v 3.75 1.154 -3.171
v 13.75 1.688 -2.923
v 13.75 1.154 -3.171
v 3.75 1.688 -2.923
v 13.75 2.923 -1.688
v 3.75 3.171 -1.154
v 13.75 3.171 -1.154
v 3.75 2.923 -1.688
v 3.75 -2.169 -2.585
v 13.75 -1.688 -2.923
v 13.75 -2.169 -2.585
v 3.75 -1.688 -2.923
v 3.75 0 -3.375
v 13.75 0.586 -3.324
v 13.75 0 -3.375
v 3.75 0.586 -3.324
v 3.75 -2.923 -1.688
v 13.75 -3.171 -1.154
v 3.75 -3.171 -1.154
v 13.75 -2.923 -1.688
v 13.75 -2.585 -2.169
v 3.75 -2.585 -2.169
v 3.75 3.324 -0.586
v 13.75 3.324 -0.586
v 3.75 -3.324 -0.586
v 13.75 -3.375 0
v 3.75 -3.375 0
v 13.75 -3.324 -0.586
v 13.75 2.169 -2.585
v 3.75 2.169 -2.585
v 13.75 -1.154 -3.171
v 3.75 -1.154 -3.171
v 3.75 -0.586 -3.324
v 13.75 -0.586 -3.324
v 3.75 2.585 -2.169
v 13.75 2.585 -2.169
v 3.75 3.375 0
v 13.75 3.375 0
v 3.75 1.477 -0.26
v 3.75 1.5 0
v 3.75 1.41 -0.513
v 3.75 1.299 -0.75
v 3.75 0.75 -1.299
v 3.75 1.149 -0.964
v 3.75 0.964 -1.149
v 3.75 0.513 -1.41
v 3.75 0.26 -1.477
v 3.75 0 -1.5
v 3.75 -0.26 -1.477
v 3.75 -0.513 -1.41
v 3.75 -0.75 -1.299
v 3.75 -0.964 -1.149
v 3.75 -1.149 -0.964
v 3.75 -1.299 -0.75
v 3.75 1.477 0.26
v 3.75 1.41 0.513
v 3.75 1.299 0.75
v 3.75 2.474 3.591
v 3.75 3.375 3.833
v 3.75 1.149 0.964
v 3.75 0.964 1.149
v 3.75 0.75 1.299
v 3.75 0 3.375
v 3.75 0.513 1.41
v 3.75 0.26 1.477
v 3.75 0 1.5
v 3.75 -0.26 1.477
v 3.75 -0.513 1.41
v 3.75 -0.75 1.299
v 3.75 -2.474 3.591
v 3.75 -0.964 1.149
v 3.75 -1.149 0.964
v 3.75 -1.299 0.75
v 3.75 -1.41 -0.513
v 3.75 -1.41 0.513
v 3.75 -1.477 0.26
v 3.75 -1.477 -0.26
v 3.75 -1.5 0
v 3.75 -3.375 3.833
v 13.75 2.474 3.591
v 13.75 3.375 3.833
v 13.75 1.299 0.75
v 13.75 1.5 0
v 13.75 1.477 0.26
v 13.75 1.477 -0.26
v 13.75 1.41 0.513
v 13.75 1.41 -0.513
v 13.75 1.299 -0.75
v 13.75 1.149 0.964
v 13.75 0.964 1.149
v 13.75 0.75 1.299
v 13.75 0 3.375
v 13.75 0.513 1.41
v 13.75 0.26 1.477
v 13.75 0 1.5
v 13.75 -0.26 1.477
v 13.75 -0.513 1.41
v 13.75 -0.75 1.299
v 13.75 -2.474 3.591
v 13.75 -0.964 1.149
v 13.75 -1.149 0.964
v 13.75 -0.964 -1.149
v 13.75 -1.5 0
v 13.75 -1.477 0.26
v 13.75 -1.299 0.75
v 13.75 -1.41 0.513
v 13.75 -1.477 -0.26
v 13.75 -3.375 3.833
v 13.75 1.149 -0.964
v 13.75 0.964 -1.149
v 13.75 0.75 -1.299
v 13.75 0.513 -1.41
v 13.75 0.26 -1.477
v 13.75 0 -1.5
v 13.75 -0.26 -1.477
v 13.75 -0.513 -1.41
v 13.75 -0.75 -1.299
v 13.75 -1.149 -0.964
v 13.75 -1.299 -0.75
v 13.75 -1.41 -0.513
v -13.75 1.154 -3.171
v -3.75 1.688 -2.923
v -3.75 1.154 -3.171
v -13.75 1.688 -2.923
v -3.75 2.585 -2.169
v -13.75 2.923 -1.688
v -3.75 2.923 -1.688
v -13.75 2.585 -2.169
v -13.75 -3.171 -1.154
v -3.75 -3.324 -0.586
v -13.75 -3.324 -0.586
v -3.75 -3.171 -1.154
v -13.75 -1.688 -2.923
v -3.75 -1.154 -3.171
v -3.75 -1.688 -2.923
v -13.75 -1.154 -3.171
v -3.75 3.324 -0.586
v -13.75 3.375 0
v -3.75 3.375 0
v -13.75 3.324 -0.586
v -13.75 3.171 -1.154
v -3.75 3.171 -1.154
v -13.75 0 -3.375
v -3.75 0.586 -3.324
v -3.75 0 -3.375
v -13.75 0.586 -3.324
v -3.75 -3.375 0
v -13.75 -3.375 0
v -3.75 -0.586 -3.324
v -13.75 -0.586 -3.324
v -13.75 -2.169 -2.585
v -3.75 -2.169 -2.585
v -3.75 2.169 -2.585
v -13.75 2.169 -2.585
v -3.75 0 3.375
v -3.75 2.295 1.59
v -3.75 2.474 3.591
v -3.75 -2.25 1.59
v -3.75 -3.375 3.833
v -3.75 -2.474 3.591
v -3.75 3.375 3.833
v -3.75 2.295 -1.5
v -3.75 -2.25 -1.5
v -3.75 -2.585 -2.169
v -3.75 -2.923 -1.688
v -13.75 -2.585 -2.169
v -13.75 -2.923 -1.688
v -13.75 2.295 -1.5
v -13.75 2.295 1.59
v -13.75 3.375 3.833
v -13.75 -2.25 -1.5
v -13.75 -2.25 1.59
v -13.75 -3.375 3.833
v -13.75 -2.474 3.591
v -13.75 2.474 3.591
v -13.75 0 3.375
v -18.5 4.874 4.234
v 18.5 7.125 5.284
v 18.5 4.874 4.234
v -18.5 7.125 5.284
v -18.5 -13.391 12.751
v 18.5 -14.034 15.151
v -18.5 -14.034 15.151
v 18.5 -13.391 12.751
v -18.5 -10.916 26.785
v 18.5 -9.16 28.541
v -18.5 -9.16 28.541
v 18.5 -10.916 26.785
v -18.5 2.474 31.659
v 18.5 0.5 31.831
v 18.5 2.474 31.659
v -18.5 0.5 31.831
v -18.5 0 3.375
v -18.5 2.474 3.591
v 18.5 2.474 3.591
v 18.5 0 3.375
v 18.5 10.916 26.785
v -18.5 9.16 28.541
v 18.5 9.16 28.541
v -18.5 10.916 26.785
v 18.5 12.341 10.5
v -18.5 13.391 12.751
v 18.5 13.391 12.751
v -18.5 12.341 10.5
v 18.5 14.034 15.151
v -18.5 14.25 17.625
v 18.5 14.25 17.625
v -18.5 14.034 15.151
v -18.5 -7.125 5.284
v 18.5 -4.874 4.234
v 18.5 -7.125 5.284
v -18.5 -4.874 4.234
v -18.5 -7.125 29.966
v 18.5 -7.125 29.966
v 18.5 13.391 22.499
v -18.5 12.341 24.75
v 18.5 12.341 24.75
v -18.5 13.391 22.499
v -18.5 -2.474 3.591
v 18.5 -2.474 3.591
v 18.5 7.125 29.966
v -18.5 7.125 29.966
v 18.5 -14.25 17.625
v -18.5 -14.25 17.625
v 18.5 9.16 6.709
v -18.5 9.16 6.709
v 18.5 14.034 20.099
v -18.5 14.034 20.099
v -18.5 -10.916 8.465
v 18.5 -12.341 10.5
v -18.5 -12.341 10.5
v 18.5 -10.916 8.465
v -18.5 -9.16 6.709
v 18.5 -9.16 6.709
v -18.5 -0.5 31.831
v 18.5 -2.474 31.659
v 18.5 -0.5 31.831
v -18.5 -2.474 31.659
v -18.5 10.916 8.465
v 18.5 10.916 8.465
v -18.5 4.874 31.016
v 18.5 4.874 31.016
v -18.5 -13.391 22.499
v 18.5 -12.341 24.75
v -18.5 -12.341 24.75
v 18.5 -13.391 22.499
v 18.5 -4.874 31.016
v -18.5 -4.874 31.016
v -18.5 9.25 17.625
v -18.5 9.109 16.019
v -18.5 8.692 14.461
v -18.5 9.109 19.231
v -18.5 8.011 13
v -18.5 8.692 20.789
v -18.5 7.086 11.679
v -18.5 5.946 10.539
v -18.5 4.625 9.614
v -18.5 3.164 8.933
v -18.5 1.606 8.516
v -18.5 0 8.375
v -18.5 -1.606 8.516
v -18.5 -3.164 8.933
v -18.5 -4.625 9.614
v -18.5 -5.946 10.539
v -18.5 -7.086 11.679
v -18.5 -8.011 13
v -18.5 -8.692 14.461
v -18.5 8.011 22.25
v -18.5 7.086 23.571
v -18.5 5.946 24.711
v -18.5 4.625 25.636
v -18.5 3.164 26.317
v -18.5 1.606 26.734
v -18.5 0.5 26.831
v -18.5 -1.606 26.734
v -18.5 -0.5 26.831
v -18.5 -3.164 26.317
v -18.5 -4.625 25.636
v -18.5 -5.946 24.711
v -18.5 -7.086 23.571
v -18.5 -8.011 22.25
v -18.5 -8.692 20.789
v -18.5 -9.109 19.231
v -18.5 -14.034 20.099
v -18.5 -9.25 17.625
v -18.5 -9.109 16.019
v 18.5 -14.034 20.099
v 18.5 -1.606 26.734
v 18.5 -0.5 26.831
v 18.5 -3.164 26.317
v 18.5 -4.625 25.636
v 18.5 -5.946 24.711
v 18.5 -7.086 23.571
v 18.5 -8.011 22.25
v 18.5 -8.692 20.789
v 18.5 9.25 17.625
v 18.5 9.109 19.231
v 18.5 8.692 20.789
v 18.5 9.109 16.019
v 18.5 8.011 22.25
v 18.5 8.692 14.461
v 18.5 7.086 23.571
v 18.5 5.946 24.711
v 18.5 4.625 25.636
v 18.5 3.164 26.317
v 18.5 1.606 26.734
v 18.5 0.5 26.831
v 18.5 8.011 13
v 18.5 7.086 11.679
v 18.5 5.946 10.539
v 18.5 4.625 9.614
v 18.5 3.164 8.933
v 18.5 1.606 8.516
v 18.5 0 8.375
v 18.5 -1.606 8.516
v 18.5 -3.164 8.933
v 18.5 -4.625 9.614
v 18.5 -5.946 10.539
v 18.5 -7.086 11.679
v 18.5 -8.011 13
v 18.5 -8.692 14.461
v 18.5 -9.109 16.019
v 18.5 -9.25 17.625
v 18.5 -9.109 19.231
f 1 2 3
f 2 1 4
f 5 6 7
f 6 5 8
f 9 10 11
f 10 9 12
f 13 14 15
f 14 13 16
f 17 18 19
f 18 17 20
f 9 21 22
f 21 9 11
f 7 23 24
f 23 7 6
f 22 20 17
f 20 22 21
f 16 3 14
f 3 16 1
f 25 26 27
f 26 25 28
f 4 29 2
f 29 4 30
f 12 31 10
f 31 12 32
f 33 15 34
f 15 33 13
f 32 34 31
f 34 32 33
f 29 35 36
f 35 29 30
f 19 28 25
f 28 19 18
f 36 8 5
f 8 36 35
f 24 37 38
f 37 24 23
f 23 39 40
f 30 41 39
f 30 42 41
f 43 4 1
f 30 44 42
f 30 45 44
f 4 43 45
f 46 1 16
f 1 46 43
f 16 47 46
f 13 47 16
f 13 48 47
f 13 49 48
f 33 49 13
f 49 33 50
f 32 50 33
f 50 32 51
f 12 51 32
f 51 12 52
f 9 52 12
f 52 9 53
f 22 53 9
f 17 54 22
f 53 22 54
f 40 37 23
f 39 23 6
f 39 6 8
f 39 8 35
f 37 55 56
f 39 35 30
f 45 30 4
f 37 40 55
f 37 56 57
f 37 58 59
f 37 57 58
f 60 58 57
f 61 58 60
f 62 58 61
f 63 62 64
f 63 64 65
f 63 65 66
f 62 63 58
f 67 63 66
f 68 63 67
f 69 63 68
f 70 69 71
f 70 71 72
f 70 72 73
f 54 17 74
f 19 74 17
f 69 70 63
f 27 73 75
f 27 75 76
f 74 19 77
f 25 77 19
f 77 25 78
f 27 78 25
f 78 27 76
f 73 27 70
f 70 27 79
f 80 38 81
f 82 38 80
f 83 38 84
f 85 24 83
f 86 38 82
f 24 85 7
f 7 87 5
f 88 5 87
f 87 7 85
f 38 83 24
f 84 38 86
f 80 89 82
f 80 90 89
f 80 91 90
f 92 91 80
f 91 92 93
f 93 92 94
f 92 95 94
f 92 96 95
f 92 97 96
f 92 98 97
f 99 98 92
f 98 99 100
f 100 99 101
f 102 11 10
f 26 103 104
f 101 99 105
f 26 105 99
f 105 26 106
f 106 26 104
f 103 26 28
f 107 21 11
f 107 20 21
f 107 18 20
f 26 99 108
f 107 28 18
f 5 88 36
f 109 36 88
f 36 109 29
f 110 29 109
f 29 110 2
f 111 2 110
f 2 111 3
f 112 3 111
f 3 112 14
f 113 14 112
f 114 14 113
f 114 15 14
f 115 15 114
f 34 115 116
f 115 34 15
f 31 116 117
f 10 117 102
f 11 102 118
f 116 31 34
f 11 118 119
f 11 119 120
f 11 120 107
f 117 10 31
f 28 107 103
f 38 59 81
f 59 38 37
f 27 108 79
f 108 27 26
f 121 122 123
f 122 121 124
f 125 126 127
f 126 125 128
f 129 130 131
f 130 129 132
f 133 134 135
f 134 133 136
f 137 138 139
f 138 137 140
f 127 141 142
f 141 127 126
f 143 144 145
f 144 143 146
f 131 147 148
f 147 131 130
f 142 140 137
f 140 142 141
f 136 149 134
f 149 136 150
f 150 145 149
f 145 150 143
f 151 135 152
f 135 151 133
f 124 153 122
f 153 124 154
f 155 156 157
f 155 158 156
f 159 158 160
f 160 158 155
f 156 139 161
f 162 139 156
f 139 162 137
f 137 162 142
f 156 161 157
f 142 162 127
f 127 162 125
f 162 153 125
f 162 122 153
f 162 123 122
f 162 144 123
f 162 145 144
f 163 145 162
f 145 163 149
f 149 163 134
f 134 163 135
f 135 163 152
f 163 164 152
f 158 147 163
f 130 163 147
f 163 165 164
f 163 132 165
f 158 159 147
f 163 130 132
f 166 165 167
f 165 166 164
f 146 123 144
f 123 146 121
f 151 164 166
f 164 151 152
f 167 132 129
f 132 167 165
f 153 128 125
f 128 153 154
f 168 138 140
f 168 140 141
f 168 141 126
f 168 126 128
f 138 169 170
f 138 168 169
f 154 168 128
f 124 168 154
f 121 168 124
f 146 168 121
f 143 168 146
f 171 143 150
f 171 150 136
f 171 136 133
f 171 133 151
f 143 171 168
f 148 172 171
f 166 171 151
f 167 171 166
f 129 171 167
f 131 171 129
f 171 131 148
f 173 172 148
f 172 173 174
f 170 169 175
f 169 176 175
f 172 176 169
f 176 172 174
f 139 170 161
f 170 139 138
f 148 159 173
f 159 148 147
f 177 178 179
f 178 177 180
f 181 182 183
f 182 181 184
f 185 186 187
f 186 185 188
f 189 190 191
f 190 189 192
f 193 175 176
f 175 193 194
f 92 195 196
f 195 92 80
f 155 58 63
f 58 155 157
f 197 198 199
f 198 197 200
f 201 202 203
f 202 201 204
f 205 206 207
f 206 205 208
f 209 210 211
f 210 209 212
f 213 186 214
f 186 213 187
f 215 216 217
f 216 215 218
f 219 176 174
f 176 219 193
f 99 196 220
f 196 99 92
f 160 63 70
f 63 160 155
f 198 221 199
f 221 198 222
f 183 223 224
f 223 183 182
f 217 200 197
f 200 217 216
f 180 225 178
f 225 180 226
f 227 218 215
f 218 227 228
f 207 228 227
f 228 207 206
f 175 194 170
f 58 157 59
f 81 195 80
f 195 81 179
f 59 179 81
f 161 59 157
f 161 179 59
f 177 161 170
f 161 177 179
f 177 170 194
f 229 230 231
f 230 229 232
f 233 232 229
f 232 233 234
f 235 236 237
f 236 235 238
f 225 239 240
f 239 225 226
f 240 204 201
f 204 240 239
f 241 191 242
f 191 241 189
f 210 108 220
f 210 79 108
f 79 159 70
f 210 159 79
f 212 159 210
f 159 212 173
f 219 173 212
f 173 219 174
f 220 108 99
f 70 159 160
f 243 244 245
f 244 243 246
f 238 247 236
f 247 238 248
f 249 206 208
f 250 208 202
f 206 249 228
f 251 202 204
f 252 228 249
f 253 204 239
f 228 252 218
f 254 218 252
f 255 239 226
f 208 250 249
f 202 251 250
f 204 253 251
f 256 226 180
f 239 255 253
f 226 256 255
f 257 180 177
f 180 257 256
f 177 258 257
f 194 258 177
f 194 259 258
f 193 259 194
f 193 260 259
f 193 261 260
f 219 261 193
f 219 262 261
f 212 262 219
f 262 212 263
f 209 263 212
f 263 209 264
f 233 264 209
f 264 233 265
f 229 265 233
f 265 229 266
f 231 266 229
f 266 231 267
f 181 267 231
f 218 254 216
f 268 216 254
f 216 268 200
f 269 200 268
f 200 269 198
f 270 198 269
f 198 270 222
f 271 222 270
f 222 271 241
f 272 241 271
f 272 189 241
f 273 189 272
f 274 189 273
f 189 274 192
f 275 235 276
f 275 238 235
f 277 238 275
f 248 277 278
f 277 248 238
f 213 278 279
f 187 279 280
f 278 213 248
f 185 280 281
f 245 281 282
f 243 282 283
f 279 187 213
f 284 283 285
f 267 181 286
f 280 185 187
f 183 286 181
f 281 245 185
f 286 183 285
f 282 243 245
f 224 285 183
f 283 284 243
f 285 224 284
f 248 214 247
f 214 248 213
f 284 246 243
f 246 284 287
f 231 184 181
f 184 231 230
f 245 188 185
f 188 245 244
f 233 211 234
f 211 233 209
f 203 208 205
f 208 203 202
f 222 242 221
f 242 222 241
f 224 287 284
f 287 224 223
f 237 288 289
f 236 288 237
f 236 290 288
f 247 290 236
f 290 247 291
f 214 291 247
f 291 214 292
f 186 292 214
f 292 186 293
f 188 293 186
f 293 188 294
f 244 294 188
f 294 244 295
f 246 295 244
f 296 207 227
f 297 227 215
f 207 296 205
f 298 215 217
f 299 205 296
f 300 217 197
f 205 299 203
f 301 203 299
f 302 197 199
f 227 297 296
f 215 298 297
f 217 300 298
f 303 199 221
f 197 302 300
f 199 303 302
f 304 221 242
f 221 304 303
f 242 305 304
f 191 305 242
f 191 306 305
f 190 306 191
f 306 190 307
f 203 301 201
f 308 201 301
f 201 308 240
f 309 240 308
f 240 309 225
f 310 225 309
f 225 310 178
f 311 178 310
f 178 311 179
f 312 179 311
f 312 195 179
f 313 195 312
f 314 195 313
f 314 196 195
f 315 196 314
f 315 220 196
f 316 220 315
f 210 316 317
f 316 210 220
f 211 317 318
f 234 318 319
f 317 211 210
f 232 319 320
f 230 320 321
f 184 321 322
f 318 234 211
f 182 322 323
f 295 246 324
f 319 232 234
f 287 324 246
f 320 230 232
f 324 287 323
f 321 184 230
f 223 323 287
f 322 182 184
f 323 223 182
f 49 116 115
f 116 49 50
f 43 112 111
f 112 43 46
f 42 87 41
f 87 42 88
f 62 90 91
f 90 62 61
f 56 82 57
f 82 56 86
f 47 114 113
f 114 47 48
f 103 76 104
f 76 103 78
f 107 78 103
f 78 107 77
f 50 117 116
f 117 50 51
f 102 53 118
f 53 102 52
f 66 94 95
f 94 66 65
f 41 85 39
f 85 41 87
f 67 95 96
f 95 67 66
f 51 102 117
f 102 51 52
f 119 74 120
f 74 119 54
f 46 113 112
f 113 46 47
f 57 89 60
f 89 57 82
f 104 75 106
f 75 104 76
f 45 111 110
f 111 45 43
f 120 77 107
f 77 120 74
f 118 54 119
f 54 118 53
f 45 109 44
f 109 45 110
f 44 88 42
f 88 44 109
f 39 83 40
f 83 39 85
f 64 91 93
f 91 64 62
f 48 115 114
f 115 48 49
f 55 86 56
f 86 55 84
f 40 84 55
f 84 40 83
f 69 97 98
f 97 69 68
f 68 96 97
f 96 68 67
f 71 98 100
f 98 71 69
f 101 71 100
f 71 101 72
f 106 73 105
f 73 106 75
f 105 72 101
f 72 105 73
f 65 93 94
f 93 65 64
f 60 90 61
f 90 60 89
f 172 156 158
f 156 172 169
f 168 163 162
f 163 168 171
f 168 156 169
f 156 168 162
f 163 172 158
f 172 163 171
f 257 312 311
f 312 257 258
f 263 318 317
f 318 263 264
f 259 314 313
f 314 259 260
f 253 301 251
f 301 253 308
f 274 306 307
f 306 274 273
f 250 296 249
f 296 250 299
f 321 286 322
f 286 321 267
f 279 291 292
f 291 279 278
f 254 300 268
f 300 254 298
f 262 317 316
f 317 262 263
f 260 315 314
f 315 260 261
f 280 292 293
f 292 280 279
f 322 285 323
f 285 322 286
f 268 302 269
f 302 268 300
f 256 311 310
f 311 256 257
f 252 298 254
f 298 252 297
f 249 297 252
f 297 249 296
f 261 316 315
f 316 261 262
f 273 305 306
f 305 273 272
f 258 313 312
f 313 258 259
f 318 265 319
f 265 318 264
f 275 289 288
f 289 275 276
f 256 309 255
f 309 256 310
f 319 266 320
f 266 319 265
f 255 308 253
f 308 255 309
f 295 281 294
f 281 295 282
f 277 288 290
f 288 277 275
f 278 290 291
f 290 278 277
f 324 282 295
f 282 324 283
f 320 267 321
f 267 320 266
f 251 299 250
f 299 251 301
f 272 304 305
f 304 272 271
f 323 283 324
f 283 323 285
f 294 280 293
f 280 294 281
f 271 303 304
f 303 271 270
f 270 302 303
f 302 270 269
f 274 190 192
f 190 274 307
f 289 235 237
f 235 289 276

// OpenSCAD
/* [Mount]*/
Mount_Diameter = 6.75;
Mount_Tab_Width = 10;
Mount_Gap = 7.5;
Mount_Pin_diameter = 3;
Mount_Pin_Flange = 4.5;
/* [Body] */
Shell_Thickness = 5;

/* [Conduit] */
Conduit_Diameter = 18.5;
Printer_Fudge = .99;
/* [Hardware] */ 
Screw_thread = 3;
Heatset_Diameter = 4.2;
/* [Hidden] */
$fn=36;

difference() {
    union() {
        rotate([0,90,0]) translate([0,0,Mount_Gap/2])cylinder(h = Mount_Tab_Width, d = Mount_Diameter);
        translate([Mount_Gap/2,-Mount_Diameter/2,0]) cube([Mount_Tab_Width,Mount_Diameter,Mount_Diameter]);
        rotate([0,-90,0])translate([0,0,Mount_Gap/2])cylinder(h = Mount_Tab_Width, d = Mount_Diameter);
        translate([-Mount_Tab_Width-Mount_Gap/2,-Mount_Diameter/2,0]) cube([Mount_Tab_Width,Mount_Diameter,Mount_Diameter]);
        translate([-Conduit_Diameter,0,Mount_Diameter/2+Conduit_Diameter/2+Shell_Thickness]) rotate([0,90,0]) cylinder(h= Conduit_Diameter*2, d = Conduit_Diameter+Shell_Thickness*2);

    }
    rotate([0,90,0]) translate([0,0,Mount_Gap/2-.01])cylinder(h = Mount_Tab_Width+0.02, d = Mount_Pin_diameter);
    translate([-Mount_Tab_Width-Mount_Gap/2-.01,-Mount_Pin_Flange/2,-Mount_Pin_diameter/2]) cube([Mount_Tab_Width+0.03,Mount_Pin_Flange*1.01,Mount_Pin_diameter*1.03]);
    translate([-Conduit_Diameter-0.01,0,Mount_Diameter/2+Conduit_Diameter/2+Shell_Thickness]) rotate([0,90,0]) cylinder(h= Conduit_Diameter*2+0.02, d = Conduit_Diameter);
    #translate([-Conduit_Diameter-0.01,-.5,Mount_Diameter/2+Conduit_Diameter/2+Shell_Thickness]) cube([Conduit_Diameter*2+0.02,1,Shell_Thickness+Conduit_Diameter]); 
}
